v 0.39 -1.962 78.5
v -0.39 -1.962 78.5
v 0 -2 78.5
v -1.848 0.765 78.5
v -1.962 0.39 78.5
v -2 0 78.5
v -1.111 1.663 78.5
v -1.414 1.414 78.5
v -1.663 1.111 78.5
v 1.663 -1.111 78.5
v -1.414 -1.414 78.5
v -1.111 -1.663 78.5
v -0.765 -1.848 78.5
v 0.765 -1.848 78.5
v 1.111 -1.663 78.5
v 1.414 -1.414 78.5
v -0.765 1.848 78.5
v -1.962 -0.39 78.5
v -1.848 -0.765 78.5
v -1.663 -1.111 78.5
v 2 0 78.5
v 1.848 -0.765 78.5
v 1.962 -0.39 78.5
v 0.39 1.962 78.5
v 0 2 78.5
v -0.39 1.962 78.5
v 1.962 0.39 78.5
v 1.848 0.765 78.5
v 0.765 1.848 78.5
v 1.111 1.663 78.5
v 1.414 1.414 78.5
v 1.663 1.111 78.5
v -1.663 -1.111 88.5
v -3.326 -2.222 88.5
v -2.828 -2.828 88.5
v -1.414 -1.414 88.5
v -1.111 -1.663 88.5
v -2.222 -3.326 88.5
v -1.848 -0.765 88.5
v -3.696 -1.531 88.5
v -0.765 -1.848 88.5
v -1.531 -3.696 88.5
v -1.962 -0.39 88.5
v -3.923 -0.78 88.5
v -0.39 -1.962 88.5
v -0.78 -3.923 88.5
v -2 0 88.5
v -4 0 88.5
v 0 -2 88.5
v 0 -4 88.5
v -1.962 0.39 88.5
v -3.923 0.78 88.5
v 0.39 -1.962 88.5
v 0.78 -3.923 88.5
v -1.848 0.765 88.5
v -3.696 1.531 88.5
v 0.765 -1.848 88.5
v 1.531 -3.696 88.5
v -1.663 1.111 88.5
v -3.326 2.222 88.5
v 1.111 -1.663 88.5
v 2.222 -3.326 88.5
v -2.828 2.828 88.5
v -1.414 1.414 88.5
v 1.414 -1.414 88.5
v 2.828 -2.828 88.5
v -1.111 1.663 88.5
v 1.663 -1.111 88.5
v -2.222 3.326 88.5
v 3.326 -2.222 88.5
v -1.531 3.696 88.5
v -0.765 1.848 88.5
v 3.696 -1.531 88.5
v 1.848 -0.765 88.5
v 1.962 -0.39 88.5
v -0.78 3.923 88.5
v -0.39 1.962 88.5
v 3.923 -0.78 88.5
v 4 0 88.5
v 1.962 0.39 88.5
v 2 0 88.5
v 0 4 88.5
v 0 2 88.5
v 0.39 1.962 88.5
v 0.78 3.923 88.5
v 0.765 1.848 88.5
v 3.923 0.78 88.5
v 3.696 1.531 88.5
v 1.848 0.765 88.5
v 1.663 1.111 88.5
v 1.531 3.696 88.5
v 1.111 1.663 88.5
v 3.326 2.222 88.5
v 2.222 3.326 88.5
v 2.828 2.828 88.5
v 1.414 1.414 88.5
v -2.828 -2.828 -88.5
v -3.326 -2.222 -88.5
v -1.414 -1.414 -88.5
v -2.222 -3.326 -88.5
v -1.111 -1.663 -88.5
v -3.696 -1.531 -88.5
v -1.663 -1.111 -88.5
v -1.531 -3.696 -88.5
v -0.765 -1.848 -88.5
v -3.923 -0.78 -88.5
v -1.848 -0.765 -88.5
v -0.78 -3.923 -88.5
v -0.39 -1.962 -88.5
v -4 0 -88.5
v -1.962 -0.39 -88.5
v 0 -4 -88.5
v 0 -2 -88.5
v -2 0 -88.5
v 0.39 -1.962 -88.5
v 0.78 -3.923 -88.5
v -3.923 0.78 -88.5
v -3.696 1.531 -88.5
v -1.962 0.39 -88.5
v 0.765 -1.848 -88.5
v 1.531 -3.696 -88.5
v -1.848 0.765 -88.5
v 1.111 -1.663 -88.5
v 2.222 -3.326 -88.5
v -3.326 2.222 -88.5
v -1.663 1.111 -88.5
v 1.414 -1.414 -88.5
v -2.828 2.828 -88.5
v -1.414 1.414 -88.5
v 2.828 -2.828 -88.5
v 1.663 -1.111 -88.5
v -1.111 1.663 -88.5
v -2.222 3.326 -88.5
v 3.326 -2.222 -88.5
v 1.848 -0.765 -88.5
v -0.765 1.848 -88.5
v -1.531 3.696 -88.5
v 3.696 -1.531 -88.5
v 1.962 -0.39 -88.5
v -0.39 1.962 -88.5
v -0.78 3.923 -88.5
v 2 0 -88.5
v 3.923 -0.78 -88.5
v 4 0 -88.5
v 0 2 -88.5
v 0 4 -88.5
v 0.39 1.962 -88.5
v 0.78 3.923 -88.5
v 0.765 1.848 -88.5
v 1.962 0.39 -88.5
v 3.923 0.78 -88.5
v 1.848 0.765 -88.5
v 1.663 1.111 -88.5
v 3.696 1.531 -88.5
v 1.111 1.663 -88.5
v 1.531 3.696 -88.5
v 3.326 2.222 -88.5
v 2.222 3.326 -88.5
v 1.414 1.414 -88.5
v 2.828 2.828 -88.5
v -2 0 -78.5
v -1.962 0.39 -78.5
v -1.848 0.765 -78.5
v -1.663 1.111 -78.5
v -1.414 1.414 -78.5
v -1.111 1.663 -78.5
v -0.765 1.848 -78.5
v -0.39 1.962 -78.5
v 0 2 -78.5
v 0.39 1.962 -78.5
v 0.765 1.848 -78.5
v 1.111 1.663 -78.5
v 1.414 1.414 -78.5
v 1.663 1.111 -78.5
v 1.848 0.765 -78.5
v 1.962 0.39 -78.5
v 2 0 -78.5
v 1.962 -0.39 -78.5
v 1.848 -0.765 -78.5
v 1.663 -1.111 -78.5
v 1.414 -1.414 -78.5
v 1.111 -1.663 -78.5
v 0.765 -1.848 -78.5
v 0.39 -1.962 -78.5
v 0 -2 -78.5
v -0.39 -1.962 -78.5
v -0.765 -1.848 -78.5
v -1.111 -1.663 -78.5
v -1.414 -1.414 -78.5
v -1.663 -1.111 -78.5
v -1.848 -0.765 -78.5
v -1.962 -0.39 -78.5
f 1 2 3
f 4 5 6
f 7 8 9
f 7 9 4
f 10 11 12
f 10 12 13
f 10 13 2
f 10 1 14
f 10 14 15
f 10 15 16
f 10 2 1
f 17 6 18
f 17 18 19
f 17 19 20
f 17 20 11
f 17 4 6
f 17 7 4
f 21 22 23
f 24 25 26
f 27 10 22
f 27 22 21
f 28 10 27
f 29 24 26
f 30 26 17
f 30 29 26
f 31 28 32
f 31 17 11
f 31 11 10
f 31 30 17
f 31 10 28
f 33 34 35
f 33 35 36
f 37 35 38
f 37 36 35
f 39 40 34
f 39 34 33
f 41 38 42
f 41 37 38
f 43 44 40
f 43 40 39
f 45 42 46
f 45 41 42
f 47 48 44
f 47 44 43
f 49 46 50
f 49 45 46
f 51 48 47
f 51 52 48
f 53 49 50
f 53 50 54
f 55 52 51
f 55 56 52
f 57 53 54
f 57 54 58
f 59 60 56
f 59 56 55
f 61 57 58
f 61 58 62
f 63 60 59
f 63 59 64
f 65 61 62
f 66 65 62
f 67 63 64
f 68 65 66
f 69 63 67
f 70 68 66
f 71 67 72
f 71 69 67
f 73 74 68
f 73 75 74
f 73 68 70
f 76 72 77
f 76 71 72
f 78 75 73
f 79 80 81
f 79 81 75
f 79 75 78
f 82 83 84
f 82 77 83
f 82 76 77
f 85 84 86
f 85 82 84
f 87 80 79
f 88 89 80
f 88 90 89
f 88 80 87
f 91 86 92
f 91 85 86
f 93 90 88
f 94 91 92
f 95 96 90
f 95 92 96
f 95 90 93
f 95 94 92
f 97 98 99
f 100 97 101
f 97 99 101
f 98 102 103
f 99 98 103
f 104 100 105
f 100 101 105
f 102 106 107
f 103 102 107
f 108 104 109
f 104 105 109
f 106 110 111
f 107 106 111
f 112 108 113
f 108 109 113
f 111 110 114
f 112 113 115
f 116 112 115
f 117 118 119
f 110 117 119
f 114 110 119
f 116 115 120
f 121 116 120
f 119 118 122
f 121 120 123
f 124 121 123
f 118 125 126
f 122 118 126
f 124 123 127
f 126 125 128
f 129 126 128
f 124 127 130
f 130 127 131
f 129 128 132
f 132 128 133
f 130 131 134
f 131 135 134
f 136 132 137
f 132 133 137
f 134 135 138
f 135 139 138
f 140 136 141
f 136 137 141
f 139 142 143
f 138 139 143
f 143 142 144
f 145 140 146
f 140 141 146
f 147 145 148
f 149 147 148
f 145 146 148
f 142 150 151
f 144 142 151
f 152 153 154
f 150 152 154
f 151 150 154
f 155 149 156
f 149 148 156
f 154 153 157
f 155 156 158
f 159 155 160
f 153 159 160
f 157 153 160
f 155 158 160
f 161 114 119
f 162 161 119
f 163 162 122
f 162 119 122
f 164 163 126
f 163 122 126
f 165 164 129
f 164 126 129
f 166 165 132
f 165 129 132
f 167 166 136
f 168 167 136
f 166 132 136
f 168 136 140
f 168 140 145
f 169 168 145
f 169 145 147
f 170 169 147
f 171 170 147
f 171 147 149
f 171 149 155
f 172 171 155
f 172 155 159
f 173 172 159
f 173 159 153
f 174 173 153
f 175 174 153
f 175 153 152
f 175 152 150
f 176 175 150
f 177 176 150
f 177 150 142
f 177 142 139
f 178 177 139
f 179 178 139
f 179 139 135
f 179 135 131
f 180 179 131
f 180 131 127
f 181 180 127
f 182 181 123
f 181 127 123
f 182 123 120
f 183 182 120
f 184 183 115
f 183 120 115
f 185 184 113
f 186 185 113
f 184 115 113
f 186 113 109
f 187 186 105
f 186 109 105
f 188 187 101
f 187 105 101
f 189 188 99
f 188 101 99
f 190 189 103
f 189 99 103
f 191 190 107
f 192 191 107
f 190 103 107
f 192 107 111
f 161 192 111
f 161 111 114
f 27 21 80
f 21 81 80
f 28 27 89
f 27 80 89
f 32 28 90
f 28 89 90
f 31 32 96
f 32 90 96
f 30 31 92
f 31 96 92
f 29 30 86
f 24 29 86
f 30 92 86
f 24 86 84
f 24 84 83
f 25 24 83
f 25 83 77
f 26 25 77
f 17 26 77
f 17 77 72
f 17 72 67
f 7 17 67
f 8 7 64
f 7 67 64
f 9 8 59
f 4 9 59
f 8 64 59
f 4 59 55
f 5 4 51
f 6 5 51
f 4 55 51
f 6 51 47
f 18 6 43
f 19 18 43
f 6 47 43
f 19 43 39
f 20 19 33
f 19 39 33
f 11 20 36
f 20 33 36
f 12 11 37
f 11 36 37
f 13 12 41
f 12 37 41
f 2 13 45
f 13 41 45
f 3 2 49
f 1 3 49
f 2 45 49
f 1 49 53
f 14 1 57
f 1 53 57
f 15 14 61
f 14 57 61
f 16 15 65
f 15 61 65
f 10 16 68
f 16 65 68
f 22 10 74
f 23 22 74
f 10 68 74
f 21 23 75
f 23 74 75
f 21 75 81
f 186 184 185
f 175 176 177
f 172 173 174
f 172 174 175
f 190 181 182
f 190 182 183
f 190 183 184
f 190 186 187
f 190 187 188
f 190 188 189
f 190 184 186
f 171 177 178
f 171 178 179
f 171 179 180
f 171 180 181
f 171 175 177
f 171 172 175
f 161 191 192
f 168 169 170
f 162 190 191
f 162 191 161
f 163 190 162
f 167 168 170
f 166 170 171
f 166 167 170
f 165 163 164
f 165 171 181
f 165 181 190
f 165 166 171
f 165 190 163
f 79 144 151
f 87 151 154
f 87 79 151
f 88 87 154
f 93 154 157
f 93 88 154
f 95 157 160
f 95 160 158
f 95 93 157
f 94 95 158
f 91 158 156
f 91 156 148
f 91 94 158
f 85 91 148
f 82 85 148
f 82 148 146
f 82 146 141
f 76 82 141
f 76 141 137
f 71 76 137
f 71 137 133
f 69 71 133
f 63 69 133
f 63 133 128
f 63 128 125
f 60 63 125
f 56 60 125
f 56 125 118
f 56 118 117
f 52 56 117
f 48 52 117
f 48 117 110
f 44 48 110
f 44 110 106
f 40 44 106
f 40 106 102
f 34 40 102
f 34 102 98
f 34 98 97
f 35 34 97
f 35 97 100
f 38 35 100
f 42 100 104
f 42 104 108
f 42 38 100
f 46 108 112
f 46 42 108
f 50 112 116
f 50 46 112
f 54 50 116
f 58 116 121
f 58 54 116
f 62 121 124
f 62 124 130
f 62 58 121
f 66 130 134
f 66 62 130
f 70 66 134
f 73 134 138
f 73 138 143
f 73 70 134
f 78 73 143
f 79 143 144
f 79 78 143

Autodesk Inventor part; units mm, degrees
ref_plane "YZ Plane" through (0, 0, 0) normal (1, 0, 0) x (0, 1, 0)
ref_plane "XZ Plane" through (0, 0, 0) normal (0, 1, 0) x (-1, 0, 0)
ref_plane "XY Plane" through (0, 0, 0) normal (0, 0, 1) x (1, 0, 0)
sketch "スケッチ1" plane through (0, 0, 0) normal (0, 0, 1) x (1, 0, 0)
  circle A0 centre (0, 0) radius 2
  circle A1 centre (0, 0) radius 4
  dimension "d0" = 4
  dimension "d1" = 8
extrude "押し出し1" add sketch "スケッチ1" along normal mid plane 177 contours A0 | A1
sketch "スケッチ3" plane through (0, 0, 88.5) normal (0, 0, 1) x (1, 0, 0)
  circle A0 centre (0, 0) radius 2
  dimension "d5" = 4
extrude "押し出し2" cut sketch "スケッチ3" against normal blind 10
sketch "スケッチ4" plane through (0, 0, -88.5) normal (0, 0, -1) x (-1, 0, 0)
  circle A0 centre (0, 0) radius 2
  dimension "d8" = 4
extrude "押し出し3" cut sketch "スケッチ4" against normal blind 10
properties part number "シャフト177mm" material "アルミニウム 7075"
